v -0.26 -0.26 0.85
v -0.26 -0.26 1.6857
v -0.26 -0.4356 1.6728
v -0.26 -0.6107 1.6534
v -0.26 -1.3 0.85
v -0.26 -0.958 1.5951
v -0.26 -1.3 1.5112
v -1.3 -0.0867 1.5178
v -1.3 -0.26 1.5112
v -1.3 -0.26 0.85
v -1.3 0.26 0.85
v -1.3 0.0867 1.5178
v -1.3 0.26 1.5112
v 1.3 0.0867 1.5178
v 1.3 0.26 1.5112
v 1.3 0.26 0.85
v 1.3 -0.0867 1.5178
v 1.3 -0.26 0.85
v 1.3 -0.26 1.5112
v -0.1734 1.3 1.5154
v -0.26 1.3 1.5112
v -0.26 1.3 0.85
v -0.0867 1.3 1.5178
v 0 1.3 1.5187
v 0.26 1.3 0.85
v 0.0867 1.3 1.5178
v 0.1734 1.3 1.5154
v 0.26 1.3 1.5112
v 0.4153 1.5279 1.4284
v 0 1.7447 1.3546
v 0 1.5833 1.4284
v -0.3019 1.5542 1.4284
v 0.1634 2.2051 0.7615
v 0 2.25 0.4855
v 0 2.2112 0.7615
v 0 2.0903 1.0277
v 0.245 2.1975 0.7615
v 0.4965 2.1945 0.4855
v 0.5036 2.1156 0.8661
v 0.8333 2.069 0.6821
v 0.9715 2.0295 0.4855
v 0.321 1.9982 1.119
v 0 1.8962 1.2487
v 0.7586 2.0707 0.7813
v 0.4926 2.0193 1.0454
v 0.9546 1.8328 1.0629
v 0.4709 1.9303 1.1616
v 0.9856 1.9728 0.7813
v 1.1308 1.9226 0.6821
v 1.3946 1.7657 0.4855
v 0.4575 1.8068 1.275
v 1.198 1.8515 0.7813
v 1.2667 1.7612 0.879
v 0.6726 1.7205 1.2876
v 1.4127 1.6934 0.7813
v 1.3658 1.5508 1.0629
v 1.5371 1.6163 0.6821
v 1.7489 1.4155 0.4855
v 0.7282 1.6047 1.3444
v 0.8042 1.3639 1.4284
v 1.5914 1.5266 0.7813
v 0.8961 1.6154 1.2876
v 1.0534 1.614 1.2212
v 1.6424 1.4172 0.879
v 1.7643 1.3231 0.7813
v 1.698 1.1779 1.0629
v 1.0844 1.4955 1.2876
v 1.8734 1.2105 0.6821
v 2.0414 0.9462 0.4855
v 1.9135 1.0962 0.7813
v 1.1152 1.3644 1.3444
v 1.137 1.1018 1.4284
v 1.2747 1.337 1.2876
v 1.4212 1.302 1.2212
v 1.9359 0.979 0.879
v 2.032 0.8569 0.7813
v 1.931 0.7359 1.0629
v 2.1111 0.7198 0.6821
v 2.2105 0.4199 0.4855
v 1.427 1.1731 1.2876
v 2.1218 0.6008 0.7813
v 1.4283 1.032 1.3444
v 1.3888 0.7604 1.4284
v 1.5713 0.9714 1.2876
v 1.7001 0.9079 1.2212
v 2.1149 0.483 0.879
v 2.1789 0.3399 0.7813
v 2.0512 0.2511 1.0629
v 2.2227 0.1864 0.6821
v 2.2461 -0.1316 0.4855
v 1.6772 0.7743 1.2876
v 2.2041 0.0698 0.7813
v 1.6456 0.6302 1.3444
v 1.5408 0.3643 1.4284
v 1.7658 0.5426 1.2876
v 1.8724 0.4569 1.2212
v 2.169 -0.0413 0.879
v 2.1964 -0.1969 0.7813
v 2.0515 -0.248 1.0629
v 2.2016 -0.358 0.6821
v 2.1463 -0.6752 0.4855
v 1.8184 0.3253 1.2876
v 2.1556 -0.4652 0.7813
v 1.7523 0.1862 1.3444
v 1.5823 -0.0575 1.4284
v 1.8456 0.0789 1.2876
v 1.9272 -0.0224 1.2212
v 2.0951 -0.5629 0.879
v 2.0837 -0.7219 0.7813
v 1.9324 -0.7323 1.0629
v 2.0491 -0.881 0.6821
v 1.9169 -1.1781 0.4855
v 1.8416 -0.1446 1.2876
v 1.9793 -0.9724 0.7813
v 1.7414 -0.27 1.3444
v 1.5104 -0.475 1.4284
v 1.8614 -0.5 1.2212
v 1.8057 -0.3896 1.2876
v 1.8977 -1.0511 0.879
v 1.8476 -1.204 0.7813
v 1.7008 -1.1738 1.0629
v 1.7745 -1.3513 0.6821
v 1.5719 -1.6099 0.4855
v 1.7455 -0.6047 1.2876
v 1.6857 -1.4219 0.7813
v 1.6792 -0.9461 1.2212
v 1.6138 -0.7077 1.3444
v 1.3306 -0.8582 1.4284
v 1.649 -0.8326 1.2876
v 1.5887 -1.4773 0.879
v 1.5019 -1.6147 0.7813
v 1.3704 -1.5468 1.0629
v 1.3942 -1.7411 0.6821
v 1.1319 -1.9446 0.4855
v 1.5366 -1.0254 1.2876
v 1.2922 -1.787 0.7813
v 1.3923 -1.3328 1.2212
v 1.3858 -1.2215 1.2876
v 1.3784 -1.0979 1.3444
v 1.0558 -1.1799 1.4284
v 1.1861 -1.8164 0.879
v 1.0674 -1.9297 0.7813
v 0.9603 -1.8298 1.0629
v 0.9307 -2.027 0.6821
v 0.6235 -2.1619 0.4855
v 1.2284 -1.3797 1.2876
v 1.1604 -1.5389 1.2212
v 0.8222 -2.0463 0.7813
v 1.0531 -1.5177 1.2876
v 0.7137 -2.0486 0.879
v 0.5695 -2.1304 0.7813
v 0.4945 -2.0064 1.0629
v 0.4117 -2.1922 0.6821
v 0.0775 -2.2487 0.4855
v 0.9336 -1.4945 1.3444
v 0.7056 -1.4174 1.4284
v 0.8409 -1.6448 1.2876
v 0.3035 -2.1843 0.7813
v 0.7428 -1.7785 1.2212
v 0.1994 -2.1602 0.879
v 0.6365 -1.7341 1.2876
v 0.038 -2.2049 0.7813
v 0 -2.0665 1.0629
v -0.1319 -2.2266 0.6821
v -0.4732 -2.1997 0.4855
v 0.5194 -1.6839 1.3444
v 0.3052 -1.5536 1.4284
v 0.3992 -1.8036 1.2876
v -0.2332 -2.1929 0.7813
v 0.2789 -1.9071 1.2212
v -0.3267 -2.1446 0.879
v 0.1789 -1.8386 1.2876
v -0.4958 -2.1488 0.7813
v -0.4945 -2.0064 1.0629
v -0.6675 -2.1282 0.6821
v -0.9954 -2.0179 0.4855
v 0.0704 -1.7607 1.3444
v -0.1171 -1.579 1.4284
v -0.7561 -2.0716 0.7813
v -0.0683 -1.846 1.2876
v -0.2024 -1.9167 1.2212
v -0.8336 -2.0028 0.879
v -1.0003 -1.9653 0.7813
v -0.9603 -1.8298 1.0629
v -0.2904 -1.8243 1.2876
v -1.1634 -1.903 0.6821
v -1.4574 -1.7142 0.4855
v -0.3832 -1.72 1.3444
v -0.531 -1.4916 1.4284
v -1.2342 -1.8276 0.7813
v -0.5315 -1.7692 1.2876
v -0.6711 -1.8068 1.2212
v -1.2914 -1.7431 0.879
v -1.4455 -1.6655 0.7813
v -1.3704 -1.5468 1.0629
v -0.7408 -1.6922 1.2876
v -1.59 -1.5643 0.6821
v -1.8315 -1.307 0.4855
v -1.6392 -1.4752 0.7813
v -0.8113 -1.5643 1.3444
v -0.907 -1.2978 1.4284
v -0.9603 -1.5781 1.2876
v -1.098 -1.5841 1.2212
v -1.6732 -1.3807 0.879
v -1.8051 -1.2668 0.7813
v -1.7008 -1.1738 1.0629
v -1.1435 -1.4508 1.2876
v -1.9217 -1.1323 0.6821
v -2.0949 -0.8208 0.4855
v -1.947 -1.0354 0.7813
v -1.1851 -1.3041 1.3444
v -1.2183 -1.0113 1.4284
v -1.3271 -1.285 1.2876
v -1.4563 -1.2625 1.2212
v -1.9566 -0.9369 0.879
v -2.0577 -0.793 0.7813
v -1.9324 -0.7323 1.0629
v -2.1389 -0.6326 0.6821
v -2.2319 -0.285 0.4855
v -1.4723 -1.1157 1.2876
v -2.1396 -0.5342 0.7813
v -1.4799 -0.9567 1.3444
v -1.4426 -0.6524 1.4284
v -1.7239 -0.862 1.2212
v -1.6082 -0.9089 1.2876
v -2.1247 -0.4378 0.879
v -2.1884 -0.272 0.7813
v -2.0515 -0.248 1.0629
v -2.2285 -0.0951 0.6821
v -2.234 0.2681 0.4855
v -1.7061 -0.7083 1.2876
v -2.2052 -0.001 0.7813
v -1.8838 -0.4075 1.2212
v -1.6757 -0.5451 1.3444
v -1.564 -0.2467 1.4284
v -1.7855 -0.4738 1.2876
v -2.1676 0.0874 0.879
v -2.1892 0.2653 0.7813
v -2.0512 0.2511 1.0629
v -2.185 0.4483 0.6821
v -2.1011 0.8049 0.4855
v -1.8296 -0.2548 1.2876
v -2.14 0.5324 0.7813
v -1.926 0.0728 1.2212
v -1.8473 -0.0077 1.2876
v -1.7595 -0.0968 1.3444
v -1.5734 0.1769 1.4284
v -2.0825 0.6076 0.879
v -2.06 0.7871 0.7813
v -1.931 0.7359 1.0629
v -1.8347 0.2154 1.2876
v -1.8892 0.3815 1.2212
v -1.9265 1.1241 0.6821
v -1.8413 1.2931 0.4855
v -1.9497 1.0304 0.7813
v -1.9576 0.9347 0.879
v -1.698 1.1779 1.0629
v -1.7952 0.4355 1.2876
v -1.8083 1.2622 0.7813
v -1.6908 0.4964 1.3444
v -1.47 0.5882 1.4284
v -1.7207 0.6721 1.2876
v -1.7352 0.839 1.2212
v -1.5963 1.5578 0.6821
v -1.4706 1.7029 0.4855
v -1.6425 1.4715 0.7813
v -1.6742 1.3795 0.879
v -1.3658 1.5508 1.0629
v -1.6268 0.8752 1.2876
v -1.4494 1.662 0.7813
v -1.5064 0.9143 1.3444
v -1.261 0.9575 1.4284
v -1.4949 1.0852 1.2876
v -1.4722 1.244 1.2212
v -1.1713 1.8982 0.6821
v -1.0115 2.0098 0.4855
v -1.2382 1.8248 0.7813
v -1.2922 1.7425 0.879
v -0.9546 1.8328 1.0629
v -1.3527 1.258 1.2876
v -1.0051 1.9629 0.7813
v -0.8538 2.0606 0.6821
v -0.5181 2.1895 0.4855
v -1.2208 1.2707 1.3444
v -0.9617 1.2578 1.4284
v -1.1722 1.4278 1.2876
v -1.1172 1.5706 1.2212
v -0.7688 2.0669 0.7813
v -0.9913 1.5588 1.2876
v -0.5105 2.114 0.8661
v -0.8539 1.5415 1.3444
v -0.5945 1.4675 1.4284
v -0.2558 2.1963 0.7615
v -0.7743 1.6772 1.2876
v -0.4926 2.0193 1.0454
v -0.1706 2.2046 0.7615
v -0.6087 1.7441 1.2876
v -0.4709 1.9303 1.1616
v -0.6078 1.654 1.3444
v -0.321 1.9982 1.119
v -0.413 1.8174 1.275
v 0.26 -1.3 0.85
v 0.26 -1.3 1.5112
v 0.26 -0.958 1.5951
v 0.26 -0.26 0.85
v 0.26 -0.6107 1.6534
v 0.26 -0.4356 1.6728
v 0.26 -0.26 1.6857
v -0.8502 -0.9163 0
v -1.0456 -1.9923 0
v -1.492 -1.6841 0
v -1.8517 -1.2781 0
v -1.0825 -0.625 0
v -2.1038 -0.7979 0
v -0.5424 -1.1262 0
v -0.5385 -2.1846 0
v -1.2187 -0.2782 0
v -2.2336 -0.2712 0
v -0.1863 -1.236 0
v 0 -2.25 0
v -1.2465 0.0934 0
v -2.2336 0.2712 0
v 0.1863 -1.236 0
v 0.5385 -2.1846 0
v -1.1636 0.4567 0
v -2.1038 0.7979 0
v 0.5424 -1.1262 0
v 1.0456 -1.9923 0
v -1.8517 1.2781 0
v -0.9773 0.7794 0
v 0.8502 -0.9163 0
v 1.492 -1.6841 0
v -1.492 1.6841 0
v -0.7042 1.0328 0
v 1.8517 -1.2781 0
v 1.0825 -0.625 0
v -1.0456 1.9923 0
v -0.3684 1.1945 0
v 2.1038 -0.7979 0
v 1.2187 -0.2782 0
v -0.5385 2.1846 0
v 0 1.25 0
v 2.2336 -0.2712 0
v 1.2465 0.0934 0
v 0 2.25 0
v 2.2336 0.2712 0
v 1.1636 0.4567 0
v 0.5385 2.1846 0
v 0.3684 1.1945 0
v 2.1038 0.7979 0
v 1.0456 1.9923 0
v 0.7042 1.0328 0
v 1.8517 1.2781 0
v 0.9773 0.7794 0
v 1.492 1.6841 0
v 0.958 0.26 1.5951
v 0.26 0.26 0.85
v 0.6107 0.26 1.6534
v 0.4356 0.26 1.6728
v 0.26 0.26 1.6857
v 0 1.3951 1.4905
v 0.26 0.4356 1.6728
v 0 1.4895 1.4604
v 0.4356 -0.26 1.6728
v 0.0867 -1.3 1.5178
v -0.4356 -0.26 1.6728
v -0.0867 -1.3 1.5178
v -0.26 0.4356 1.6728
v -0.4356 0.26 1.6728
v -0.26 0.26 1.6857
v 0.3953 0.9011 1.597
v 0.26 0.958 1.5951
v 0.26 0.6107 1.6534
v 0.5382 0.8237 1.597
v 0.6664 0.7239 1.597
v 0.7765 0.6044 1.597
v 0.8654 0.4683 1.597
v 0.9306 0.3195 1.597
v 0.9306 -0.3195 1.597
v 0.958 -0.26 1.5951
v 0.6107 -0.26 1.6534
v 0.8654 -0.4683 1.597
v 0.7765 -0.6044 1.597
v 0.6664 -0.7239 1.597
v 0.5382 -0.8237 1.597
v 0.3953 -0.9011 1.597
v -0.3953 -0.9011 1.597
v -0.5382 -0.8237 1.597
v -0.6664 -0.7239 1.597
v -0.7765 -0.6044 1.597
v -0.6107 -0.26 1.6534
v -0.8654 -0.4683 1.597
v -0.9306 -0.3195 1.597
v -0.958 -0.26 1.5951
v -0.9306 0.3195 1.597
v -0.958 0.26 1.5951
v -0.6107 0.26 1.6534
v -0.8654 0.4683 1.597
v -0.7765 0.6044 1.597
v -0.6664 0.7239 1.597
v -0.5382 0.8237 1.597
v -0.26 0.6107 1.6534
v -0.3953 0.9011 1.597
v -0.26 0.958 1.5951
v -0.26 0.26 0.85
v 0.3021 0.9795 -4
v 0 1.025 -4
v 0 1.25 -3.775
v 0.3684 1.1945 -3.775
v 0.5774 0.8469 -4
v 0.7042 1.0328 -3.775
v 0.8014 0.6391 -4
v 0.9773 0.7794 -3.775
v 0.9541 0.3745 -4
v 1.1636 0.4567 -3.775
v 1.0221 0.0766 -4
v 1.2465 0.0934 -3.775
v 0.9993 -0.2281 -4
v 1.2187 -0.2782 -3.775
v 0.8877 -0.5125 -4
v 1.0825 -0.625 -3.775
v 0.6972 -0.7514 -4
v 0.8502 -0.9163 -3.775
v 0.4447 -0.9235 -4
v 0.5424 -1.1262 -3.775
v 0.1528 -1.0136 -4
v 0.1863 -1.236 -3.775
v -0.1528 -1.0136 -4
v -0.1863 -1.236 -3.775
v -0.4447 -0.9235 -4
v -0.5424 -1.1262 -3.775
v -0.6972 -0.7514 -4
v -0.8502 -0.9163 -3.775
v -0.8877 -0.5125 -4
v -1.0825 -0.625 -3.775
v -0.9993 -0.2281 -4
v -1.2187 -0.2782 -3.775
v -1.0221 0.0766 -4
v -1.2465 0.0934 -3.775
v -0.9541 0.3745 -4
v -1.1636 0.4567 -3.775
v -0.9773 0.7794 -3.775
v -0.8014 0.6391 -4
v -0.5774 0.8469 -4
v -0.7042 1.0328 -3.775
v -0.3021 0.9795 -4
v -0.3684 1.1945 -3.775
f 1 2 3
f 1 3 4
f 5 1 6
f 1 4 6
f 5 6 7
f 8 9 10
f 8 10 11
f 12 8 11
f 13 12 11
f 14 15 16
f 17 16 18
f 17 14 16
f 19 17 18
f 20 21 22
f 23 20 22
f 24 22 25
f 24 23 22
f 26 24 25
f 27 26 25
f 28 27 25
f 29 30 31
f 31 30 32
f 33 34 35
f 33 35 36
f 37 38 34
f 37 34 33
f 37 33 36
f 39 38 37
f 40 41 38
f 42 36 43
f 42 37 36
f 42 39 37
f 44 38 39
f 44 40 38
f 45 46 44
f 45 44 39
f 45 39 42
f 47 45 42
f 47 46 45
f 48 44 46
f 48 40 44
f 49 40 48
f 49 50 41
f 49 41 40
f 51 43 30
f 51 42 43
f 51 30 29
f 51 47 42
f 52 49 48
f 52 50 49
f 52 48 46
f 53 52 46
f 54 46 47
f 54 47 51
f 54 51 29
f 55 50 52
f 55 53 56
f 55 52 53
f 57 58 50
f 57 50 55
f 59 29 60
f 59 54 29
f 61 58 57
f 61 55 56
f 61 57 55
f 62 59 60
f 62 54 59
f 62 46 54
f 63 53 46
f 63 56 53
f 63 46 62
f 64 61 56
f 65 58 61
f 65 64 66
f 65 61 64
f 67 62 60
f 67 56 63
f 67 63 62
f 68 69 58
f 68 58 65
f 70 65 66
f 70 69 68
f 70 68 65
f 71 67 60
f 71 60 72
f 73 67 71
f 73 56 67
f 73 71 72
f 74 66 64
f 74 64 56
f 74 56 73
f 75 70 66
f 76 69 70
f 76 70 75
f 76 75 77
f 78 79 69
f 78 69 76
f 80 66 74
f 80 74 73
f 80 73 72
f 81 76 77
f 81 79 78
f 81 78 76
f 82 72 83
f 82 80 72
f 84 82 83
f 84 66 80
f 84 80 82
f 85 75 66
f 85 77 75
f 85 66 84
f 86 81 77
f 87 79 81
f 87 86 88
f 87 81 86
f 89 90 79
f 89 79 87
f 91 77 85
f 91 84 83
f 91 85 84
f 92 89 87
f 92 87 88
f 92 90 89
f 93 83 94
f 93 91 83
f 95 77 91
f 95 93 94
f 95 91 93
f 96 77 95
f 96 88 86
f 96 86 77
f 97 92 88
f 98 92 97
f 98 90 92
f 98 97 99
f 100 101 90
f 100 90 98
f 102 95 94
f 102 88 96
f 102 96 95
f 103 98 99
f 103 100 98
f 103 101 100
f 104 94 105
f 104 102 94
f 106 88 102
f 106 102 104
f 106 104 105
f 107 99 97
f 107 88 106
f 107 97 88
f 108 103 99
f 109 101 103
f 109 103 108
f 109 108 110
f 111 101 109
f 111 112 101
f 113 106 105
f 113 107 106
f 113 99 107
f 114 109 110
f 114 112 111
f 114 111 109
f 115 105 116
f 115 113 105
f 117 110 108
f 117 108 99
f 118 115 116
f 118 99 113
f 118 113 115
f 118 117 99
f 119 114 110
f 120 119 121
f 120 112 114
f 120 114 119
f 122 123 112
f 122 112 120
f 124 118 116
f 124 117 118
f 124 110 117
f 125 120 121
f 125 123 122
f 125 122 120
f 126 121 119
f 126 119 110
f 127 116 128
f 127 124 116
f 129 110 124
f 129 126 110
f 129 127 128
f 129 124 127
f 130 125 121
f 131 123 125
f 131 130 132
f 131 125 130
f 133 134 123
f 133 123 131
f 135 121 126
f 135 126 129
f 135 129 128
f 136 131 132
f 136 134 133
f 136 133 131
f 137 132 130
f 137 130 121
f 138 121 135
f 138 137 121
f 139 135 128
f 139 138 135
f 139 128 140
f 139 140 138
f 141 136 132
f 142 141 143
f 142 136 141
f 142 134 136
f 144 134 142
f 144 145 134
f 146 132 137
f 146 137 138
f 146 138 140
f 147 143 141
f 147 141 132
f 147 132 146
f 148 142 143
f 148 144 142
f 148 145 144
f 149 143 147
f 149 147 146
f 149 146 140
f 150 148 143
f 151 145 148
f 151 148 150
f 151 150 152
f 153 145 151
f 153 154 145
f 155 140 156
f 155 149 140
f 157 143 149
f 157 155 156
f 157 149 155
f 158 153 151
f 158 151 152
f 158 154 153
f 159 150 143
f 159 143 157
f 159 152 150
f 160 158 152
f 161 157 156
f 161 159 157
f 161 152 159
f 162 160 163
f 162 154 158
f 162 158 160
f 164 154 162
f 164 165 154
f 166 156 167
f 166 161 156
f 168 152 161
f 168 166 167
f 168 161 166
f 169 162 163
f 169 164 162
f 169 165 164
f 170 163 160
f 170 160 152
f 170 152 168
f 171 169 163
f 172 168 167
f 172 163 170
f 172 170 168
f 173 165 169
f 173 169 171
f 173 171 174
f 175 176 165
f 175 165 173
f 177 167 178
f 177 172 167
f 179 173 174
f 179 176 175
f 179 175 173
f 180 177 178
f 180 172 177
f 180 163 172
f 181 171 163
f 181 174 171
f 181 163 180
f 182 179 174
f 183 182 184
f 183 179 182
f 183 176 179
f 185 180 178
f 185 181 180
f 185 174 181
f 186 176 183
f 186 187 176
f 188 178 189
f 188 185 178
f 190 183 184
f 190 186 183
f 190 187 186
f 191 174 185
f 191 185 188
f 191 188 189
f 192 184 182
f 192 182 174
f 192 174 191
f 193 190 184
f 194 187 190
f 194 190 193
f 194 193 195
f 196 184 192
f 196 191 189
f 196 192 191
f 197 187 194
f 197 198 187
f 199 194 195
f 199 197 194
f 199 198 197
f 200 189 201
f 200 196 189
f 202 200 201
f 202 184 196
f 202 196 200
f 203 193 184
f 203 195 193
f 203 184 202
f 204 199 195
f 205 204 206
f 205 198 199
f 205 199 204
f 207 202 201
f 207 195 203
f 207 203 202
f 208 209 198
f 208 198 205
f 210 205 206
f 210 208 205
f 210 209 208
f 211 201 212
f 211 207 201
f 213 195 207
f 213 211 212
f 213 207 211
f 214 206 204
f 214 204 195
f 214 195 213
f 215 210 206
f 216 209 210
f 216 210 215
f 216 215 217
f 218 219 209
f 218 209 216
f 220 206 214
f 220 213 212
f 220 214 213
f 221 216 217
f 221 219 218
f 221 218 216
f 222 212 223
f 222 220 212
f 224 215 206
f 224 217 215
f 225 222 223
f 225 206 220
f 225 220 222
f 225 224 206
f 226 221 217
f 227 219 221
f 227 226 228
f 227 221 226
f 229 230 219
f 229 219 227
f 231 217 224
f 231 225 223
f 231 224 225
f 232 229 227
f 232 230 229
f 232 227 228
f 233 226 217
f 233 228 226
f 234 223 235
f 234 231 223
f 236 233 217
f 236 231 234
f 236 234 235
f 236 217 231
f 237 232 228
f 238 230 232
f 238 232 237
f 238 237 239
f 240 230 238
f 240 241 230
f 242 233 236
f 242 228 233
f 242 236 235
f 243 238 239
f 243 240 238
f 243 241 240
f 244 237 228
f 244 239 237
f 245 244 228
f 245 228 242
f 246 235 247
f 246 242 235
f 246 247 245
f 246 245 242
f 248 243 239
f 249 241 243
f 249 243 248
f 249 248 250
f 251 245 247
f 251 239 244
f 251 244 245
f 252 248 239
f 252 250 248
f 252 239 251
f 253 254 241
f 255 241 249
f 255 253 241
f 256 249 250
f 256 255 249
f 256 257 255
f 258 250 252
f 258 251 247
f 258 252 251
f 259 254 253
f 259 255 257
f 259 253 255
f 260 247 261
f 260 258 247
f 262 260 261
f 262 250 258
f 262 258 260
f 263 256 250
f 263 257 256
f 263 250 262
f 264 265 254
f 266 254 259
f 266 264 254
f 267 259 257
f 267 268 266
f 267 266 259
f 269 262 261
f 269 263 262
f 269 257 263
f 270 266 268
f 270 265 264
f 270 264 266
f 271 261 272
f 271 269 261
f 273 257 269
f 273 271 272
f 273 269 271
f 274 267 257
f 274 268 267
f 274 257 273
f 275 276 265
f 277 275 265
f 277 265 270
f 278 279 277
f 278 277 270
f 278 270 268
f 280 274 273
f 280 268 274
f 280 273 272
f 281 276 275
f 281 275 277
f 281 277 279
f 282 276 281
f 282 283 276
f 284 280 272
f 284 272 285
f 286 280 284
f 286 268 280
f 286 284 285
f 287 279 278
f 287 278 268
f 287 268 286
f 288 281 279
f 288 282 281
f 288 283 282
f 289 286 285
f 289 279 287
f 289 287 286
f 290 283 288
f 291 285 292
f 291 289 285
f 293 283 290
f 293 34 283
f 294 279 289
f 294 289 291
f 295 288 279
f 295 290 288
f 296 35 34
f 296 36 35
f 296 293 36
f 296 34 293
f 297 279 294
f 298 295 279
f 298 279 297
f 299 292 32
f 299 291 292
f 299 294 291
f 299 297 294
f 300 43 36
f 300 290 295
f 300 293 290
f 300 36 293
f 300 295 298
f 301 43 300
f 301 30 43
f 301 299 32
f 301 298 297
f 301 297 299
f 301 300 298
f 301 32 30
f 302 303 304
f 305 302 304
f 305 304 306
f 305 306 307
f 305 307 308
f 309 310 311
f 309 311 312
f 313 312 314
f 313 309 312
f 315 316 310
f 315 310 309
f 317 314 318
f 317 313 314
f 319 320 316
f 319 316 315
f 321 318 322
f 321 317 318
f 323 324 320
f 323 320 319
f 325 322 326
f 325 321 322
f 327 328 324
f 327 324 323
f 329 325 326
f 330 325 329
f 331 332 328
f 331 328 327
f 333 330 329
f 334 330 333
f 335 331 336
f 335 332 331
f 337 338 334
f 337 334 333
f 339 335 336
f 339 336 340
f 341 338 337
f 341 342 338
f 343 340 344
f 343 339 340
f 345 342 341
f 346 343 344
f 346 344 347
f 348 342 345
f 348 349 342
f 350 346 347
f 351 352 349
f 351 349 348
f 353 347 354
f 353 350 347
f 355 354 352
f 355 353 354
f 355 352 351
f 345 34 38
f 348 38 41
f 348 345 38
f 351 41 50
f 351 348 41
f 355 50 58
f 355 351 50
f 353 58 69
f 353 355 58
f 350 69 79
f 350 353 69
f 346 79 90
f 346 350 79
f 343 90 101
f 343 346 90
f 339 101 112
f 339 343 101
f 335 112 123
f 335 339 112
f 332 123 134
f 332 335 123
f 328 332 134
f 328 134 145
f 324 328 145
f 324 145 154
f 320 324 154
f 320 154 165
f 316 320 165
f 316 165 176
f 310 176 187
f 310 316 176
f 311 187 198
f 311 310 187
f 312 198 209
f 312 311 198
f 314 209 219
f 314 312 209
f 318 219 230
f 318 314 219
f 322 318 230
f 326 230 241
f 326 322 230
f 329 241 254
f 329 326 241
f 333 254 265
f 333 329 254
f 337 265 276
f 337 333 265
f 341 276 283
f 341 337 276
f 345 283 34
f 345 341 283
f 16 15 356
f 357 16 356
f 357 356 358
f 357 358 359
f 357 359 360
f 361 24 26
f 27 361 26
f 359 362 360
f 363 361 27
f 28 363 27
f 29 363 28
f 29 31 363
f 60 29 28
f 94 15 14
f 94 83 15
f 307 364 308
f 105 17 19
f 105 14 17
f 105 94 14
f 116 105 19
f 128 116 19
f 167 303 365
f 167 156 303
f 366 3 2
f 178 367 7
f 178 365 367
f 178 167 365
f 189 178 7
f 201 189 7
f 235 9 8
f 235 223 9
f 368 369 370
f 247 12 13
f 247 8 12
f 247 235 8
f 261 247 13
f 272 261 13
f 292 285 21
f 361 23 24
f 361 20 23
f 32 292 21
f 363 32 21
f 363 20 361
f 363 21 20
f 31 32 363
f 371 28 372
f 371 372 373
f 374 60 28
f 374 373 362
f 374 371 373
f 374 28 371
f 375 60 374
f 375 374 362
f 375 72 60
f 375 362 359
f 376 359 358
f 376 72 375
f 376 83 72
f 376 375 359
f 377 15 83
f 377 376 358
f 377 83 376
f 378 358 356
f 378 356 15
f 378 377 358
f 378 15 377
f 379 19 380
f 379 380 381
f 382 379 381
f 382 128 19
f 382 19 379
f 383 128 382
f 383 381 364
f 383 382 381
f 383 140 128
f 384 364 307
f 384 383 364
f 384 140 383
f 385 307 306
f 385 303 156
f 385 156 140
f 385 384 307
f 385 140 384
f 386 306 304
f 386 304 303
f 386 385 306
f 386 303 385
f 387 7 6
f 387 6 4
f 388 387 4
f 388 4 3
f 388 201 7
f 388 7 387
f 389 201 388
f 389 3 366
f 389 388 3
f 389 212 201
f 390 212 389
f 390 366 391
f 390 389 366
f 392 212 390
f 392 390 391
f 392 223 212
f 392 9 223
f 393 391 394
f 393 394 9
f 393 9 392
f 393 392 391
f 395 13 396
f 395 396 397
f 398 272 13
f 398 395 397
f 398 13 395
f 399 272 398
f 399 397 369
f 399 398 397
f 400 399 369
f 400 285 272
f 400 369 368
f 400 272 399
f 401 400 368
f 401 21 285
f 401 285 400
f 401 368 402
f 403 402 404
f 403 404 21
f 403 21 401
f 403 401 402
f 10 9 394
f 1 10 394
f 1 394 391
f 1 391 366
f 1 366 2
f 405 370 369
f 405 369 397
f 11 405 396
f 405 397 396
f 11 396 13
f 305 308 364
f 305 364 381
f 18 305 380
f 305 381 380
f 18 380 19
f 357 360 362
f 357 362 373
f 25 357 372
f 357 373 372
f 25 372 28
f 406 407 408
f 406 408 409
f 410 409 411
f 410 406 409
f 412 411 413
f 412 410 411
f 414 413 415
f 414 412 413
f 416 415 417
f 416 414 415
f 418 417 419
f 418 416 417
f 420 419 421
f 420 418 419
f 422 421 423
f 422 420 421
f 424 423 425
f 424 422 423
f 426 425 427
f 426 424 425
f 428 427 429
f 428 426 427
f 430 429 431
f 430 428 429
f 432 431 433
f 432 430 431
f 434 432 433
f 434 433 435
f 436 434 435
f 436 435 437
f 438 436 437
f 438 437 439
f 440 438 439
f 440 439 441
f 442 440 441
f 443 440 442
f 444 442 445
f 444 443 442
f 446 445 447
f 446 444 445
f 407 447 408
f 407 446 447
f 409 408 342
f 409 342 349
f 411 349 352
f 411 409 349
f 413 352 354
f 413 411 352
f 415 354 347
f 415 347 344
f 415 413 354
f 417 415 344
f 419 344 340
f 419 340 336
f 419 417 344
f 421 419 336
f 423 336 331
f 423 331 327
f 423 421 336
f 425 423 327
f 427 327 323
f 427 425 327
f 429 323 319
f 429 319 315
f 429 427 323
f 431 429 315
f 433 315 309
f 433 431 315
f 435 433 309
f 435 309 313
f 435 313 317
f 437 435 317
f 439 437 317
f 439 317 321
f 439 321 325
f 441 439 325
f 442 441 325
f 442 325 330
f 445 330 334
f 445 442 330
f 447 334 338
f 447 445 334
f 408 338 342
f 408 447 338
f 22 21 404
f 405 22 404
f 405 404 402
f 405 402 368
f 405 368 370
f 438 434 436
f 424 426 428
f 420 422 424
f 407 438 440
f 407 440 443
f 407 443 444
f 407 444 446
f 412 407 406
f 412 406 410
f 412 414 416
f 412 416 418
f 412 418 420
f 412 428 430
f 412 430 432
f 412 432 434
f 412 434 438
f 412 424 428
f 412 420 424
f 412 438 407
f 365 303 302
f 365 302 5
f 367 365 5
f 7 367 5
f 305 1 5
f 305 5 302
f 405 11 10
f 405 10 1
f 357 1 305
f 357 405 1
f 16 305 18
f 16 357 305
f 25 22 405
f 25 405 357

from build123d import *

# Parameters (mm, degrees)
CUT_EXTRUDE2_DEPTH = 0.85
FILLET1_R          = 1
CHAMFER1_SIZE      = 0.225


with BuildPart() as part:
    # Sketch1 → Revolve1 (revolve)
    with BuildSketch(Plane(origin=(0, 0, 0), x_dir=(0, 0, -1), z_dir=(1, 0, 0))):
        with BuildLine():
            Line((-1.133333333, 2.25), (0, 2.25))
            Line((0, 2.25), (0, 1.25))
            Line((0, 1.25), (4, 1.25))
            Line((4, 1.25), (4, 0))
            Line((4, 0), (-1.7, 0))
            ThreePointArc((-1.7, 0), (-1.556155418, 1.1601305), (-1.133333333, 2.25))
        make_face()
    revolve(axis=Axis((0, 0, 33.735969773), (0, 0, -1)))

    # Sketch2 → Cut-Extrude2 (cut)
    with BuildSketch(Plane(origin=(0, 0, 1.7), x_dir=(-1, 0, 0), z_dir=(0, 0, -1))):
        Polygon((0, 1.3), (0.26, 1.3), (0.26, 0.26), (1.3, 0.26), (1.3, 0), (1.3, -0.26), (0.26, -0.26), (0.26, -1.3), (0, -1.3), (-0.26, -1.3), (-0.26, -0.26), (-1.3, -0.26), (-1.3, 0), (-1.3, 0.26), (-0.26, 0.26), (-0.26, 1.3), align=None)
    extrude(amount=CUT_EXTRUDE2_DEPTH, mode=Mode.SUBTRACT)

    # Fillet1
    fillet1_edges = [part.edges().sort_by_distance(p)[0] for p in [
        (0, -2.25, 1.133333333),
    ]]
    fillet(fillet1_edges, radius=FILLET1_R)

    # Chamfer1
    chamfer1_edges = [part.edges().sort_by_distance(p)[0] for p in [
        (0, -1.25, -4),
    ]]
    chamfer(chamfer1_edges, length=CHAMFER1_SIZE)


solid = part.part
